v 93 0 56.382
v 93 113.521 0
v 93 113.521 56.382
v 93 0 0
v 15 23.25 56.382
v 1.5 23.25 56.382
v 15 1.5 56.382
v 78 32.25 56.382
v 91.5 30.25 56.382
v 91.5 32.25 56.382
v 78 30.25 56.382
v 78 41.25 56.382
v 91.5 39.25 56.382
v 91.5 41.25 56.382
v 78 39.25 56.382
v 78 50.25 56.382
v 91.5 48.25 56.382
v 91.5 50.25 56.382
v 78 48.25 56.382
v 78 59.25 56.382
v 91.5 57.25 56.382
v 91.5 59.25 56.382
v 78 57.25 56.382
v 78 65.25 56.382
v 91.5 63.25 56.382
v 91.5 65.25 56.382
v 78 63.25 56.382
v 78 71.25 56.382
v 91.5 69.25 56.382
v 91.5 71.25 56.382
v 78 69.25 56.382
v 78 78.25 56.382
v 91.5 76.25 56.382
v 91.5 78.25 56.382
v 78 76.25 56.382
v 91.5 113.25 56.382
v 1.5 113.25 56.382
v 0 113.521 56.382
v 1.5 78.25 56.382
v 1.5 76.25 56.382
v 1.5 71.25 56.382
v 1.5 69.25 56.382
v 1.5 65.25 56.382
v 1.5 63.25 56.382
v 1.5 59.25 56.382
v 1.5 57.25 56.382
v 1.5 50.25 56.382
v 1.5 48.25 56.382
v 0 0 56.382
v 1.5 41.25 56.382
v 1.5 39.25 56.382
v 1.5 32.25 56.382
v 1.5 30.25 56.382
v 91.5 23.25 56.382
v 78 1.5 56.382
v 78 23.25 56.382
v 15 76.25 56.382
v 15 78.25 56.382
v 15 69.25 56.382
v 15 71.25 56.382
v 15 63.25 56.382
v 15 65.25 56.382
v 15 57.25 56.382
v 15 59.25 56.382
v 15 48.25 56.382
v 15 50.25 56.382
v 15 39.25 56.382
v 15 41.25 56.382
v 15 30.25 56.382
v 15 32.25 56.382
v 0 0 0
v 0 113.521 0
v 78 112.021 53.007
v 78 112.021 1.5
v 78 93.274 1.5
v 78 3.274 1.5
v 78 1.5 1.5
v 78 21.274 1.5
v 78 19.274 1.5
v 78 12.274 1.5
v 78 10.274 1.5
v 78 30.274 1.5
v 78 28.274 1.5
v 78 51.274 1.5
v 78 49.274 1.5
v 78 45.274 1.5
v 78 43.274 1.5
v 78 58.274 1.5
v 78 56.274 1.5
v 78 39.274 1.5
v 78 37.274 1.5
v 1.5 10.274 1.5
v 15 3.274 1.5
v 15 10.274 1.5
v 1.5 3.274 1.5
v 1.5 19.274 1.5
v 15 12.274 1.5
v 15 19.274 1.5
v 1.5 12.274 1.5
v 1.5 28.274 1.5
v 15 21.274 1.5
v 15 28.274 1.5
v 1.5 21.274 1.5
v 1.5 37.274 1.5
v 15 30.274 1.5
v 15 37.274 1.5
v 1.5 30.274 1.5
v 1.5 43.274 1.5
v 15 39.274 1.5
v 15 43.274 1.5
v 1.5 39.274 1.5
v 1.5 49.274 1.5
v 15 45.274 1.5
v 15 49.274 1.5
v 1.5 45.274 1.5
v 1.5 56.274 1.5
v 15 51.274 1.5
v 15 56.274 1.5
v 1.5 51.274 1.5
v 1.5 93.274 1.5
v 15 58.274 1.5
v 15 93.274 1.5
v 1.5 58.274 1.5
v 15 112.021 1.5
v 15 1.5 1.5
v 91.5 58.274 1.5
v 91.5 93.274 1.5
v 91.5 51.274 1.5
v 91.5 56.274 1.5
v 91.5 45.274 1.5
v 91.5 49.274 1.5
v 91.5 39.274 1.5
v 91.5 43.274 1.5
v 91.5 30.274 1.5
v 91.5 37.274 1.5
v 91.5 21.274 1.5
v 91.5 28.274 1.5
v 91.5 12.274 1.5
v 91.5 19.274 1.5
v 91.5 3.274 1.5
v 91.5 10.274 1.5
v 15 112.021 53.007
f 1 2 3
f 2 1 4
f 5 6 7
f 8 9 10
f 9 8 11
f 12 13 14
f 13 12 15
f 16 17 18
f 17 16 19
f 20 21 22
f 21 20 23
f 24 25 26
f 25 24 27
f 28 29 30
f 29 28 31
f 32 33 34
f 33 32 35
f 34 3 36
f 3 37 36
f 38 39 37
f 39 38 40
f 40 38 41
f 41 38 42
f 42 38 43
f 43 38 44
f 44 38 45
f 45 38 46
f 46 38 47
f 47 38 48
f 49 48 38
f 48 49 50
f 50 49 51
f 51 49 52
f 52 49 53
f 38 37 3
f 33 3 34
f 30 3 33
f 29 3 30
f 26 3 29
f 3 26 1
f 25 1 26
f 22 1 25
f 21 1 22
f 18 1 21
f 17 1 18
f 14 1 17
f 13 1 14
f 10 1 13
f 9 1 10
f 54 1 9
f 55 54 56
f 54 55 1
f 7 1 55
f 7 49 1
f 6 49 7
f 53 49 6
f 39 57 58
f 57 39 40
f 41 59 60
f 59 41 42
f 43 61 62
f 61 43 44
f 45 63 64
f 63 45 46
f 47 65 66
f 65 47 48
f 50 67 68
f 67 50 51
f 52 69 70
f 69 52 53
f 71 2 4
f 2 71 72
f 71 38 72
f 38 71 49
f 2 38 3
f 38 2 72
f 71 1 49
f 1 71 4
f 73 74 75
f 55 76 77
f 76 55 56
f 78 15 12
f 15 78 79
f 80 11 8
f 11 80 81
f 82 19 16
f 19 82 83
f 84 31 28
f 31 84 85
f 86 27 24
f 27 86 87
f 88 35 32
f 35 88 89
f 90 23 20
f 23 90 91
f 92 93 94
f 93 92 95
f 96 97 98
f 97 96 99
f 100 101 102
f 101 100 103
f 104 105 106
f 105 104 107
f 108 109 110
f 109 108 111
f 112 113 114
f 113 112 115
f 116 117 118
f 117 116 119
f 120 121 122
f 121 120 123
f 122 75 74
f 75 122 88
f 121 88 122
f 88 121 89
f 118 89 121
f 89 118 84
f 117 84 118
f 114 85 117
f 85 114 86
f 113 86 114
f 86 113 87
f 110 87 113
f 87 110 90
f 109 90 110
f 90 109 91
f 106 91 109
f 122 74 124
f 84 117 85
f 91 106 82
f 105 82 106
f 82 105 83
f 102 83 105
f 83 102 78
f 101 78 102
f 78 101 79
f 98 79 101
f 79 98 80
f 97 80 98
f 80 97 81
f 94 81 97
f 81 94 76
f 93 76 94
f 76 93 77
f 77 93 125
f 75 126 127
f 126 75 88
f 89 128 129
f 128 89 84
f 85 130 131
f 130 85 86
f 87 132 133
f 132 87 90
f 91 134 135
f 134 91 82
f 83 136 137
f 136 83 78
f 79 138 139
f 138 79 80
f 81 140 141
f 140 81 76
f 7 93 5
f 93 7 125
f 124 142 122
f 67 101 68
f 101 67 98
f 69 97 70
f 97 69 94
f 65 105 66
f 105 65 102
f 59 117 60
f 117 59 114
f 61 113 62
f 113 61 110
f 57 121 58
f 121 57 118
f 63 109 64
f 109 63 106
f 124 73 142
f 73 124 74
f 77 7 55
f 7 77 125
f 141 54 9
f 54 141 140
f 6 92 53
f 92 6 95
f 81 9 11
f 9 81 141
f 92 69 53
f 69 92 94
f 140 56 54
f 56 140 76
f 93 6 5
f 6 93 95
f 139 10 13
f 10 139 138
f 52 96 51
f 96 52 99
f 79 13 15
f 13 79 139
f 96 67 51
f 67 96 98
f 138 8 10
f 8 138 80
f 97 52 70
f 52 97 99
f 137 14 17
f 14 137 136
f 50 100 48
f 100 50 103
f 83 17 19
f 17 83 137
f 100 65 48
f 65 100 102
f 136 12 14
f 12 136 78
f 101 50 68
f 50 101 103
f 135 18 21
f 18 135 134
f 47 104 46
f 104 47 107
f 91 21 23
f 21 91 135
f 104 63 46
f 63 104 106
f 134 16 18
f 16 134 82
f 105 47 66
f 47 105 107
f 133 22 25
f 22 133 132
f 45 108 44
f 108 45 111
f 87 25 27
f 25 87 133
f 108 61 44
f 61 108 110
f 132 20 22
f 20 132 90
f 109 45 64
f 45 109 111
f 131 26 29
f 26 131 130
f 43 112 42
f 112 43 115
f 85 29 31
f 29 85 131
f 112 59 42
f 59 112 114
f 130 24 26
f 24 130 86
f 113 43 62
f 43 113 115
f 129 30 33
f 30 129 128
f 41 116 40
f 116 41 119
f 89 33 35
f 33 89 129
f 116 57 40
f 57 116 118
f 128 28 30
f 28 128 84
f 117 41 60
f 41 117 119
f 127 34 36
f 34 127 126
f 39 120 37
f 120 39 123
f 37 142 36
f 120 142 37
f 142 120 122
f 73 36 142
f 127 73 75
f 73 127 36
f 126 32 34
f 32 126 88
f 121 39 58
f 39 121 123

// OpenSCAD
include <../../The-Boardgame-Insert-Toolkit.v2.45/boardgame_insert_toolkit_lib.2.scad>;

// determines whether lids are output.
g_b_print_lid = false;

// determines whether boxes are output.
g_b_print_box = true; 

// Focus on one box
g_isolated_print_box = ""; 

// Used to visualize how all of the boxes fit together. 
g_b_visualization = false;          
        
// this is the outer wall thickness. 
//Default = 1.5mm
g_wall_thickness = 1.5;

// The tolerance value is extra space put between planes of the lid and box that fit together.
// Increase the tolerance to loosen the fit and decrease it to tighten it.
//
// Note that the tolerance is applied exclusively to the lid.
// So if the lid is too tight or too loose, change this value ( up for looser fit, down for tighter fit ) and 
// you only need to reprint the lid.
// 
// The exception is the stackable box, where the bottom of the box is the lid of the box below,
// in which case the tolerance also affects that box bottom.
//
g_tolerance = 0.15;

// This adjusts the position of the lid detents downward. 
// The larger the value, the bigger the gap between the lid and the box.
g_tolerance_detents_pos = 0.1;

card_shear_angle = 20;

card_height = 90;
card_width = 60;

starter_deck_thickness = 7;
emergency_plan_deck_thickness = 4;
dice_distribution_deck_thickness = 4;
s_deck_thickness = 5;
main_deck_thickness = 35;

cutout_percentage = 70;

slot_separation_thickness = 2;

slot_angle = 90 - card_shear_angle;
slot_offset_caused_by_shear = (cos(slot_angle)*card_width)*0.615;

tiger_deck_slot_position = slot_offset_caused_by_shear;
tiger_deck_slot_thickness = starter_deck_thickness;
tiger_deck_slot_label = "Tiger";
tiger_deck_slot_icon = "tiger.svg";

dragon_deck_slot_position = tiger_deck_slot_position + tiger_deck_slot_thickness + slot_separation_thickness;
dragon_deck_slot_thickness = starter_deck_thickness;
dragon_deck_slot_label = "Dragon";
dragon_deck_slot_icon = "dragon.svg";

ox_deck_slot_position = dragon_deck_slot_position + dragon_deck_slot_thickness + slot_separation_thickness;
ox_deck_slot_thickness = starter_deck_thickness;
ox_deck_slot_label = "Ox";
ox_deck_slot_icon = "ox.svg";

horse_deck_slot_position = ox_deck_slot_position + ox_deck_slot_thickness + slot_separation_thickness;
horse_deck_slot_thickness = starter_deck_thickness;
horse_deck_slot_label = "Ox";
horse_deck_slot_icon = "ox.svg";

emergency_plan_deck_slot_position = horse_deck_slot_position + horse_deck_slot_thickness + slot_separation_thickness;
emergency_plan_deck_slot_thickness = emergency_plan_deck_thickness;
emergency_plan_deck_slot_label = "Ox";
emergency_plan_deck_slot_icon = "ox.svg";

dice_distribution_deck_slot_position = emergency_plan_deck_slot_position + emergency_plan_deck_slot_thickness + slot_separation_thickness;
dice_distribution_deck_slot_thickness = dice_distribution_deck_thickness;

s_deck_slot_position = dice_distribution_deck_slot_position + dice_distribution_deck_slot_thickness + slot_separation_thickness;
s_deck_slot_thickness = s_deck_thickness;

main_deck_slot_position = s_deck_slot_position + s_deck_slot_thickness + slot_separation_thickness;
main_deck_slot_thickness = main_deck_thickness;

box_length =
	tiger_deck_slot_thickness +
	dragon_deck_slot_thickness +
	ox_deck_slot_thickness +
	horse_deck_slot_thickness +
	emergency_plan_deck_slot_thickness +
	dice_distribution_deck_slot_thickness +
	s_deck_slot_thickness +
	main_deck_slot_thickness +
	(7 * slot_separation_thickness) +
	(cos(slot_angle) * card_width) +
	(g_wall_thickness * 2);

box_height = sin(slot_angle) * card_width;

function shear_correction_y(angle, box_height, compartment_height) = -tan(angle)*(box_height/2 - g_wall_thickness - cos(angle)*compartment_height/2);

data =
[
	[   "cards",
		[
			[ BOX_SIZE_XYZ, [ card_height + (g_wall_thickness*2), box_length, box_height] ],
			[ BOX_STACKABLE_B, f ],
			[ BOX_NO_LID_B, true ],
			[ BOX_LID,
				[
					[ LID_PATTERN_RADIUS, 10],
					[ LID_PATTERN_THICKNESS, 1.5],
					[ LABEL,
						[
							[ LBL_TEXT,     "STOCK"],
							[ LBL_SIZE,     AUTO ],
						]
					],  

					[ LID_PATTERN_N1,               10 ],
					[ LID_PATTERN_N2,               10 ],
					[ LID_PATTERN_ANGLE,            60 ],
					[ LID_PATTERN_ROW_OFFSET,       10 ],
					[ LID_PATTERN_COL_OFFSET,       140 ],
					[ LID_PATTERN_THICKNESS,        0.6 ],
				],
			],
			[ BOX_COMPONENT,
				[ // cutout
					[CMP_COMPARTMENT_SIZE_XYZ,      [card_height * (cutout_percentage/100), box_length - (g_wall_thickness*2), card_width] ],
				]
			],
			[ BOX_COMPONENT,
				[ // player starter deck (tiger)
					[CMP_COMPARTMENT_SIZE_XYZ,      [card_height, tiger_deck_slot_thickness, card_width] ],
					[CMP_SHEAR,                     [0,card_shear_angle]],
					[POSITION_XY,                   [0,tiger_deck_slot_position - shear_correction_y(card_shear_angle, box_height, box_height)]],
//					[LABEL,
//						[
//							[ENABLED_B, false],
//							//[LBL_TEXT,        tiger_deck_slot_label],
//							[LBL_IMAGE, tiger_deck_slot_icon],
//							[LBL_PLACEMENT,   BACK_WALL],
//							[LBL_SIZE,        4],
//							[ LBL_DEPTH, 4 ],
//							[POSITION_XY, [38,27]],
//						]
//					]
				]
			],
			[ BOX_COMPONENT,
				[ // player starter deck (dragon)
					[CMP_COMPARTMENT_SIZE_XYZ,      [card_height, dragon_deck_slot_thickness, card_width] ],
					[CMP_SHEAR,                     [0,card_shear_angle]],
					[POSITION_XY,                   [0,dragon_deck_slot_position - shear_correction_y(card_shear_angle, box_height, box_height)]],
//					[LABEL,
//						[
//							[ENABLED_, false],
//							[LBL_TEXT,        dragon_deck_slot_label],
//							//[LBL_IMAGE, dragon_deck_slot_icon],
//							[LBL_PLACEMENT,   BACK_WALL],
//							[LBL_SIZE,        1],
//							[ LBL_DEPTH, 1 ],
//							[POSITION_XY, [38,27]],
//						]
//					]
				]
			],
			[ BOX_COMPONENT,
				[ // player starter deck (ox)
					[CMP_COMPARTMENT_SIZE_XYZ,      [card_height, ox_deck_slot_thickness, card_width] ],
					[CMP_SHEAR,                     [0,card_shear_angle]],
					[POSITION_XY,                   [0,ox_deck_slot_position - shear_correction_y(card_shear_angle, box_height, box_height)]],
//					[LABEL,
//						[
//							[ENABLED_B, labels_enabled],
//							//[LBL_TEXT,        ox_deck_slot_label],
//							[LBL_IMAGE, ox_deck_slot_icon],
//							[LBL_PLACEMENT,   BACK_WALL],
//							[LBL_SIZE,        4],
//							[ LBL_DEPTH, 4 ],
//							[POSITION_XY, [38,27]],
//						]
//					]
				]
			],
			[ BOX_COMPONENT,
				[ // player starter deck (horse)
					[CMP_COMPARTMENT_SIZE_XYZ,      [card_height, horse_deck_slot_thickness, card_width] ],
					[CMP_SHEAR,                     [0,card_shear_angle]],
					[POSITION_XY,                   [0,horse_deck_slot_position - shear_correction_y(card_shear_angle, box_height, box_height)]],
//					[LABEL,
//						[
//							[ENABLED_B, labels_enabled],
//							//[LBL_TEXT,        ox_deck_slot_label],
//							[LBL_IMAGE, ox_deck_slot_icon],
//							[LBL_PLACEMENT,   BACK_WALL],
//							[LBL_SIZE,        4],
//							[ LBL_DEPTH, 4 ],
//							[POSITION_XY, [38,27]],
//						]
//					]
				]
			],
			[ BOX_COMPONENT,
				[ // Emergency plan
					[CMP_COMPARTMENT_SIZE_XYZ,      [card_height, emergency_plan_deck_slot_thickness, card_width] ],
					[CMP_SHEAR,                     [0,card_shear_angle]],
					[POSITION_XY,                   [0,emergency_plan_deck_slot_position - shear_correction_y(card_shear_angle, box_height, box_height)]],
//					[LABEL,
//						[
//							[ENABLED_B, labels_enabled],
//							//[LBL_TEXT,        ox_deck_slot_label],
//							[LBL_IMAGE, ox_deck_slot_icon],
//							[LBL_PLACEMENT,   BACK_WALL],
//							[LBL_SIZE,        4],
//							[ LBL_DEPTH, 4 ],
//							[POSITION_XY, [38,27]],
//						]
//					]
				]
			],
			[ BOX_COMPONENT,
				[ // Dice distribution
					[CMP_COMPARTMENT_SIZE_XYZ,      [card_height, dice_distribution_deck_thickness, card_width] ],
					[CMP_SHEAR,                     [0,card_shear_angle]],
					[POSITION_XY,                   [0,dice_distribution_deck_slot_position - shear_correction_y(card_shear_angle, box_height, box_height)]],
//					[LABEL,
//						[
//							[ENABLED_B, labels_enabled],
//							//[LBL_TEXT,        ox_deck_slot_label],
//							[LBL_IMAGE, ox_deck_slot_icon],
//							[LBL_PLACEMENT,   BACK_WALL],
//							[LBL_SIZE,        4],
//							[ LBL_DEPTH, 4 ],
//							[POSITION_XY, [38,27]],
//						]
//					]
				]
			],
			[ BOX_COMPONENT,
				[ // s cards
					[CMP_COMPARTMENT_SIZE_XYZ,      [card_height, s_deck_thickness, card_width] ],
					[CMP_SHEAR,                     [0,card_shear_angle]],
					[POSITION_XY,                   [0,s_deck_slot_position - shear_correction_y(card_shear_angle, box_height, box_height)]],
//					[LABEL,
//						[
//							[ENABLED_B, labels_enabled],
//							//[LBL_TEXT,        ox_deck_slot_label],
//							[LBL_IMAGE, ox_deck_slot_icon],
//							[LBL_PLACEMENT,   BACK_WALL],
//							[LBL_SIZE,        4],
//							[ LBL_DEPTH, 4 ],
//							[POSITION_XY, [38,27]],
//						]
//					]
				]
			],
			[ BOX_COMPONENT,
				[ // main cards
					[CMP_COMPARTMENT_SIZE_XYZ,      [card_height, main_deck_thickness, card_width] ],
					[CMP_SHEAR,                     [0,card_shear_angle]],
					[POSITION_XY,                   [0,main_deck_slot_position - shear_correction_y(card_shear_angle, box_height, box_height)]],
//					[LABEL,
//						[
//							[ENABLED_B, labels_enabled],
//							//[LBL_TEXT,        ox_deck_slot_label],
//							[LBL_IMAGE, ox_deck_slot_icon],
//							[LBL_PLACEMENT,   BACK_WALL],
//							[LBL_SIZE,        4],
//							[ LBL_DEPTH, 4 ],
//							[POSITION_XY, [38,27]],
//						]
//					]
				]
			],
		]
	],
];


MakeAll();
